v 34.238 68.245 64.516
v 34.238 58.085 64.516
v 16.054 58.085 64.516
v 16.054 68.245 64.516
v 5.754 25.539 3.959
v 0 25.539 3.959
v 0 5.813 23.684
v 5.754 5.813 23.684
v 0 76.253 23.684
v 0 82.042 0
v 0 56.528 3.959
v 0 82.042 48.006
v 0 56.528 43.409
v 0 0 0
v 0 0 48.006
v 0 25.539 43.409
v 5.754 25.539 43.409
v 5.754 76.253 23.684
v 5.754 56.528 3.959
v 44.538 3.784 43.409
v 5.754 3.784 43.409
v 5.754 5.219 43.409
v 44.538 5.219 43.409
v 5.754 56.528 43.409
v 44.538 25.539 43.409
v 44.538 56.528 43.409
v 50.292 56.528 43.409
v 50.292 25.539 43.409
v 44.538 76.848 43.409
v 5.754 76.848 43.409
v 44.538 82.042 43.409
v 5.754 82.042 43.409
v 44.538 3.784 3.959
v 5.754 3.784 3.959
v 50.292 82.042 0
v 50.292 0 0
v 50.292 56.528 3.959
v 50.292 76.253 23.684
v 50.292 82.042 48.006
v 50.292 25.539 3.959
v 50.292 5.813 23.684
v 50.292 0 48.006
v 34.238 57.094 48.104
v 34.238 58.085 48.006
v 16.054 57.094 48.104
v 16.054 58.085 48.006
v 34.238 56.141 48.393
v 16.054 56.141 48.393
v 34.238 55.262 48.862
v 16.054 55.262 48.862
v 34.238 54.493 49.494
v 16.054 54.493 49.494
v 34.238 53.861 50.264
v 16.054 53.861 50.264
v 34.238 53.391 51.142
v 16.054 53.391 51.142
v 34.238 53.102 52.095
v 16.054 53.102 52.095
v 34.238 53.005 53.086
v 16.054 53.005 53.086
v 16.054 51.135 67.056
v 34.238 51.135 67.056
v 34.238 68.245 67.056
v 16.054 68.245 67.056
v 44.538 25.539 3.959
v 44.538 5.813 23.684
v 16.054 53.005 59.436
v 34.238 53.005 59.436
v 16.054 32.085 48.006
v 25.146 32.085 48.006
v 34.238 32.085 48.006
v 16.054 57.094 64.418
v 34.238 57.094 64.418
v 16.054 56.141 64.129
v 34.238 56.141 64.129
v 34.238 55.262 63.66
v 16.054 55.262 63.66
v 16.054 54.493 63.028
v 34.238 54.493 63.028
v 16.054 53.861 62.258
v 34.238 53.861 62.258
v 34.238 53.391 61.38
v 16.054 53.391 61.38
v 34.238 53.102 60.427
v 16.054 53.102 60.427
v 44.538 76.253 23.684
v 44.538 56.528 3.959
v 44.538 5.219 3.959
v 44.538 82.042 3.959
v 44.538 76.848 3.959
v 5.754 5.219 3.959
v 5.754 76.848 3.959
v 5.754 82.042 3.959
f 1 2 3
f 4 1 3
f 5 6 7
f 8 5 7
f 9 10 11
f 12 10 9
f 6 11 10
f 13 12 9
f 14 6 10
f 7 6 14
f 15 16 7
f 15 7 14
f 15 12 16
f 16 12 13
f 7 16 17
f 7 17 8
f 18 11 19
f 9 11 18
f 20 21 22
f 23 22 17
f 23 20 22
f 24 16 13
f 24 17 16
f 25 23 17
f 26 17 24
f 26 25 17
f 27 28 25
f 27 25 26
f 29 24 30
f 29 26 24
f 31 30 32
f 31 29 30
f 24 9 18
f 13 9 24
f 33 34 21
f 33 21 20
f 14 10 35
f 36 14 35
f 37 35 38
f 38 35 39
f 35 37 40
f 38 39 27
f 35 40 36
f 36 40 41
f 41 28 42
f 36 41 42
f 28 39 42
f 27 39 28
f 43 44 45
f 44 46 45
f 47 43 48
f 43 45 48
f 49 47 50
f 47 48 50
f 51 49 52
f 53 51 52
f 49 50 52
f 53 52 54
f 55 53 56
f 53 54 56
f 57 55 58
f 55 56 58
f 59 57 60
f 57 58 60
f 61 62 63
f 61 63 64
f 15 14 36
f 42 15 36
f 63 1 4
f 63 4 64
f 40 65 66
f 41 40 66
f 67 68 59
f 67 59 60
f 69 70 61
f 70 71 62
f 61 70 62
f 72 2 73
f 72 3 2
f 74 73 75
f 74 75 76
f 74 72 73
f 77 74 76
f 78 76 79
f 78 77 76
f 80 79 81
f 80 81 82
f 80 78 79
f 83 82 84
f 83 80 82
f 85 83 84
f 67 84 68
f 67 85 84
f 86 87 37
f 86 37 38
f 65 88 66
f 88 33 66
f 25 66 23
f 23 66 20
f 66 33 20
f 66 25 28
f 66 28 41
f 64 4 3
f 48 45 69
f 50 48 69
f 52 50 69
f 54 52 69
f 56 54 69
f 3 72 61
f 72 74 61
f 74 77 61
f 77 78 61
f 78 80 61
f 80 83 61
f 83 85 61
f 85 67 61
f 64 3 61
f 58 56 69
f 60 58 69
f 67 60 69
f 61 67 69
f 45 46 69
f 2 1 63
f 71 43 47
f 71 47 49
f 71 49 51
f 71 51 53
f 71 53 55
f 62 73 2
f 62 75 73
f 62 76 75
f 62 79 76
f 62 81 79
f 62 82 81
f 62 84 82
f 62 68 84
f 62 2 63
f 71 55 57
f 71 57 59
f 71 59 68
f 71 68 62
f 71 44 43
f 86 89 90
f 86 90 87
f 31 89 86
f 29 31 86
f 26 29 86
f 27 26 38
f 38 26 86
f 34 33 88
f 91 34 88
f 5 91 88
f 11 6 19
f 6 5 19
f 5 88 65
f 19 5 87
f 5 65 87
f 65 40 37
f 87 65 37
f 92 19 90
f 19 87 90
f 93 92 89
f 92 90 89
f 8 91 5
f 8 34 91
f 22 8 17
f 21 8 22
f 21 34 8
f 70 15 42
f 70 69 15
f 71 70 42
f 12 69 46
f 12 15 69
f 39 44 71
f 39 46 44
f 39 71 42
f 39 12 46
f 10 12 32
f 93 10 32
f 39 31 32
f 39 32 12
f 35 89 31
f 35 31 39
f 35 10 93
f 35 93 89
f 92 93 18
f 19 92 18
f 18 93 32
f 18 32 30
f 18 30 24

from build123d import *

# Parameters (mm, degrees)
F0_W          = 50.292
F0_H          = 82.042
F1_DEPTH      = 48.006
F2_W          = 39.4548750482
F2_H          = 39.4502789713
F3_DEPTH      = 101.6
F4_W          = 71.629058104
F4_H          = 39.4502789713
F5_DEPTH      = 101.6
F5_DEPTH_BACK = 25.4
F6_T1_DEPTH   = 5.7536101086
F6_T3_DEPTH   = 5.0835148431
F6_T8_DEPTH   = 58.0102084241
F6_T14_DEPTH  = 58.0102084241
F6_T20_DEPTH  = 58.0102084241
F6_T26_DEPTH  = 57.3401131586
F6_T32_DEPTH  = 57.3401131586
F6_T38_DEPTH  = 58.0102084241
F6_T44_DEPTH  = 57.3401131586
F6_T50_DEPTH  = 57.3401131586
F7_W          = 4.0118359902
F7_H          = 8.2200020552
F8_DEPTH      = 19.05
F9_DEPTH      = 12.7
F10_SIZE      = 19.04999
F11_DEPTH     = 5.08
F13_DEPTH     = 10.16
F14_W         = 18.1836719804
F14_H         = 16.51
F15_DEPTH     = 10.16
F16_R         = 5.08
F17_DEPTH     = 5.08
F18_W         = 38.7847797828
F18_H         = 3.7839086726
F19_DEPTH     = 40.64


# Not quite as in the source:
# - a fillet or chamfer that OpenCascade refuses, or shapes differently, is made with other operations: its cross-section is extruded or revolved along the edge and cut away or added
# - a fillet or chamfer is up to 0.001 mm smaller than in the source, because OpenCascade refuses the exact size


with BuildPart() as f1:
    # F0 (on Top) → F1 (new body)
    with BuildSketch(Plane.XY):
        with Locations((25.146, 41.021)):
            Rectangle(F0_W, F0_H)
    extrude(amount=F1_DEPTH)

    # F2 (on face) → F3 (cut)
    with BuildSketch(Plane.XZ):
        with Locations((24.8109523673, 23.683816893)):
            Rectangle(F2_W, F2_H)
    extrude(amount=-F3_DEPTH, mode=Mode.SUBTRACT)

    # F4 (on face) → F5 (cut, two sides)
    with BuildSketch(Plane.YZ.offset(5.0835148431)) as f5_sk:
        with Locations((41.033150861, 23.683816893)):
            Rectangle(F4_W, F4_H)
    extrude(amount=F5_DEPTH, mode=Mode.SUBTRACT)
    extrude(f5_sk.sketch, amount=-F5_DEPTH_BACK, mode=Mode.SUBTRACT)

    # F6: chamfer of 20.32 on 8 edges, made by hand

    # F6_s2 → F6_t1 (join)
    with BuildSketch(Plane.YZ.offset(44.5383898914)):
        Polygon((56.527679913, 3.9586774074), (76.847679913, 24.2786774074), (76.847679913, 3.9586774074), align=None)
        Polygon((25.538621809, 3.9586774074), (5.218621809, 24.2786774074), (5.218621809, 3.9586774074), align=None)
        Polygon((25.538621809, 43.4089563787), (5.218621809, 23.0889563787), (5.218621809, 43.4089563787), align=None)
        Polygon((56.527679913, 43.4089563787), (76.847679913, 23.0889563787), (76.847679913, 43.4089563787), align=None)
    extrude(amount=F6_T1_DEPTH)

    # F6_s4 → F6_t3 (join)
    with BuildSketch(Plane.YZ):
        Polygon((25.538621809, 43.4089563787), (5.218621809, 23.0889563787), (5.218621809, 43.4089563787), align=None)
        Polygon((25.538621809, 3.9586774074), (5.218621809, 24.2786774074), (5.218621809, 3.9586774074), align=None)
        Polygon((76.847679913, 23.0889563787), (56.527679913, 43.4089563787), (76.847679913, 43.4089563787), align=None)
        Polygon((56.527679913, 3.9586774074), (76.847679913, 24.2786774074), (76.847679913, 3.9586774074), align=None)
    extrude(amount=F6_T3_DEPTH)


with BuildPart() as f6_tool6:
    # F6_s7 → F6_t8 (new body)
    with BuildSketch(Plane.YZ.offset(-7.7182084241)):
        Polygon((56.527679913, 3.9586774074), (76.847679913, 24.2786774074), (76.847679913, 3.9586774074), align=None)
    extrude(amount=F6_T8_DEPTH)

    split(bisect_by=Plane.YZ, keep=Keep.TOP)

    split(bisect_by=Plane.YZ.offset(5.0835148431), keep=Keep.BOTTOM)


with BuildPart() as f1_1:
    add(f1.part)

    # F6_t5: union F6_tool6
    add(f6_tool6.part)


with BuildPart() as f6_tool12:
    # F6_s13 → F6_t14 (new body)
    with BuildSketch(Plane.YZ.offset(-7.7182084241)):
        Polygon((25.538621809, 3.9586774074), (5.218621809, 24.2786774074), (5.218621809, 3.9586774074), align=None)
    extrude(amount=F6_T14_DEPTH)

    split(bisect_by=Plane.YZ, keep=Keep.TOP)

    split(bisect_by=Plane.YZ.offset(5.0835148431), keep=Keep.BOTTOM)


with BuildPart() as f1_2:
    add(f1_1.part)

    # F6_t11: union F6_tool12
    add(f6_tool12.part)


with BuildPart() as f6_tool18:
    # F6_s19 → F6_t20 (new body)
    with BuildSketch(Plane.YZ.offset(50.292)):
        Polygon((25.538621809, 43.4089563787), (5.218621809, 23.0889563787), (5.218621809, 43.4089563787), align=None)
    extrude(amount=-F6_T20_DEPTH)

    split(bisect_by=Plane.YZ, keep=Keep.TOP)

    split(bisect_by=Plane.YZ.offset(5.0835148431), keep=Keep.BOTTOM)


with BuildPart() as f1_3:
    add(f1_2.part)

    # F6_t17: union F6_tool18
    add(f6_tool18.part)


with BuildPart() as f6_tool24:
    # F6_s25 → F6_t26 (new body)
    with BuildSketch(Plane.YZ.offset(57.3401131586)):
        Polygon((25.538621809, 43.4089563787), (5.218621809, 23.0889563787), (5.218621809, 43.4089563787), align=None)
    extrude(amount=-F6_T26_DEPTH)

    split(bisect_by=Plane.YZ.offset(50.292), keep=Keep.BOTTOM)

    split(bisect_by=Plane.YZ.offset(44.5383898914), keep=Keep.TOP)


with BuildPart() as f1_4:
    add(f1_3.part)

    # F6_t23: union F6_tool24
    add(f6_tool24.part)


with BuildPart() as f6_tool30:
    # F6_s31 → F6_t32 (new body)
    with BuildSketch(Plane.YZ):
        Polygon((25.538621809, 3.9586774074), (5.218621809, 24.2786774074), (5.218621809, 3.9586774074), align=None)
    extrude(amount=F6_T32_DEPTH)

    split(bisect_by=Plane.YZ.offset(50.292), keep=Keep.BOTTOM)

    split(bisect_by=Plane.YZ.offset(44.5383898914), keep=Keep.TOP)


with BuildPart() as f1_5:
    add(f1_4.part)

    # F6_t29: union F6_tool30
    add(f6_tool30.part)


with BuildPart() as f6_tool36:
    # F6_s37 → F6_t38 (new body)
    with BuildSketch(Plane.YZ.offset(50.292)):
        Polygon((56.527679913, 43.4089563787), (76.847679913, 23.0889563787), (76.847679913, 43.4089563787), align=None)
    extrude(amount=-F6_T38_DEPTH)

    split(bisect_by=Plane.YZ, keep=Keep.TOP)

    split(bisect_by=Plane.YZ.offset(5.0835148431), keep=Keep.BOTTOM)


with BuildPart() as f1_6:
    add(f1_5.part)

    # F6_t35: union F6_tool36
    add(f6_tool36.part)


with BuildPart() as f6_tool42:
    # F6_s43 → F6_t44 (new body)
    with BuildSketch(Plane.YZ.offset(57.3401131586)):
        Polygon((76.847679913, 23.0889563787), (56.527679913, 43.4089563787), (76.847679913, 43.4089563787), align=None)
    extrude(amount=-F6_T44_DEPTH)

    split(bisect_by=Plane.YZ.offset(50.292), keep=Keep.BOTTOM)

    split(bisect_by=Plane.YZ.offset(44.5383898914), keep=Keep.TOP)


with BuildPart() as f1_7:
    add(f1_6.part)

    # F6_t41: union F6_tool42
    add(f6_tool42.part)


with BuildPart() as f6_tool48:
    # F6_s49 → F6_t50 (new body)
    with BuildSketch(Plane.YZ):
        Polygon((56.527679913, 3.9586774074), (76.847679913, 24.2786774074), (76.847679913, 3.9586774074), align=None)
    extrude(amount=F6_T50_DEPTH)

    split(bisect_by=Plane.YZ.offset(50.292), keep=Keep.BOTTOM)

    split(bisect_by=Plane.YZ.offset(44.5383898914), keep=Keep.TOP)


with BuildPart() as f1_8:
    add(f1_7.part)

    # F6_t47: union F6_tool48
    add(f6_tool48.part)

    # F7 (on face) → F8 (join)
    with BuildSketch(Plane.XY.offset(48.006)):
        with Locations((27.1519179951, 36.1947827041)):
            Rectangle(F7_W, F7_H)
    extrude(amount=F8_DEPTH)

    # F9 (add): a face of the model
    f9_faces = [f1_8.faces().sort_by_distance(p)[0] for p in [
        (27.1519179951, 40.3047837317, 57.531),
    ]]
    extrude(f9_faces, amount=F9_DEPTH)

    # F10 (size 19.05 in the source; OpenCascade refuses exactly that, so slightly less here)
    f10_edges = [f1_8.edges().sort_by_distance(p)[0] for p in [
        (27.151918, 32.084782, 67.056),
    ]]
    chamfer(f10_edges, length=F10_SIZE)

    # F11 (add): a face of the model
    f11_faces = [f1_8.faces().sort_by_distance(p)[0] for p in [
        (29.1578359902, 45.9802990729, 54.8770427375),
    ]]
    extrude(f11_faces, amount=F11_DEPTH)

    # F12: F1 across face


with BuildPart() as f1_9:
    add(f1_8.part)
    add(f1_8.part.mirror(Plane(origin=(25.146, 45.9802990729, 54.8770427375), x_dir=(0, -1, 0), z_dir=(-1, 0, 0))))

    # F13 (add): a face of the model
    f13_faces = [f1_9.faces().sort_by_distance(p)[0] for p in [
        (25.146, 53.0047837317, 57.531),
    ]]
    extrude(f13_faces, amount=F13_DEPTH)

    # F14 (on face) → F15 (cut)
    with BuildSketch(Plane(origin=(0, 63.1647837317, 0), x_dir=(-1, 0, 0), z_dir=(0, 1, 0))):
        with Locations((-25.146, 56.261)):
            Rectangle(F14_W, F14_H)
    extrude(amount=-F15_DEPTH, mode=Mode.SUBTRACT)

    # F16
    f16_edges = [f1_9.edges().sort_by_distance(p)[0] for p in [
        (25.146, 53.004784, 64.516),
        (25.146, 53.004784, 48.006),
    ]]
    fillet(f16_edges, radius=F16_R)

    # F17 (add): a face of the model
    f17_faces = [f1_9.faces().sort_by_distance(p)[0] for p in [
        (25.146, 63.1647837317, 65.786),
    ]]
    extrude(f17_faces, amount=F17_DEPTH)

    # F18 (on face) → F19 (join)
    with BuildSketch(Plane.XY.offset(3.9586774074)):
        with Locations((25.146, 1.8919543363)):
            Rectangle(F18_W, F18_H)
    extrude(amount=F19_DEPTH)


solid = f1_9.part
